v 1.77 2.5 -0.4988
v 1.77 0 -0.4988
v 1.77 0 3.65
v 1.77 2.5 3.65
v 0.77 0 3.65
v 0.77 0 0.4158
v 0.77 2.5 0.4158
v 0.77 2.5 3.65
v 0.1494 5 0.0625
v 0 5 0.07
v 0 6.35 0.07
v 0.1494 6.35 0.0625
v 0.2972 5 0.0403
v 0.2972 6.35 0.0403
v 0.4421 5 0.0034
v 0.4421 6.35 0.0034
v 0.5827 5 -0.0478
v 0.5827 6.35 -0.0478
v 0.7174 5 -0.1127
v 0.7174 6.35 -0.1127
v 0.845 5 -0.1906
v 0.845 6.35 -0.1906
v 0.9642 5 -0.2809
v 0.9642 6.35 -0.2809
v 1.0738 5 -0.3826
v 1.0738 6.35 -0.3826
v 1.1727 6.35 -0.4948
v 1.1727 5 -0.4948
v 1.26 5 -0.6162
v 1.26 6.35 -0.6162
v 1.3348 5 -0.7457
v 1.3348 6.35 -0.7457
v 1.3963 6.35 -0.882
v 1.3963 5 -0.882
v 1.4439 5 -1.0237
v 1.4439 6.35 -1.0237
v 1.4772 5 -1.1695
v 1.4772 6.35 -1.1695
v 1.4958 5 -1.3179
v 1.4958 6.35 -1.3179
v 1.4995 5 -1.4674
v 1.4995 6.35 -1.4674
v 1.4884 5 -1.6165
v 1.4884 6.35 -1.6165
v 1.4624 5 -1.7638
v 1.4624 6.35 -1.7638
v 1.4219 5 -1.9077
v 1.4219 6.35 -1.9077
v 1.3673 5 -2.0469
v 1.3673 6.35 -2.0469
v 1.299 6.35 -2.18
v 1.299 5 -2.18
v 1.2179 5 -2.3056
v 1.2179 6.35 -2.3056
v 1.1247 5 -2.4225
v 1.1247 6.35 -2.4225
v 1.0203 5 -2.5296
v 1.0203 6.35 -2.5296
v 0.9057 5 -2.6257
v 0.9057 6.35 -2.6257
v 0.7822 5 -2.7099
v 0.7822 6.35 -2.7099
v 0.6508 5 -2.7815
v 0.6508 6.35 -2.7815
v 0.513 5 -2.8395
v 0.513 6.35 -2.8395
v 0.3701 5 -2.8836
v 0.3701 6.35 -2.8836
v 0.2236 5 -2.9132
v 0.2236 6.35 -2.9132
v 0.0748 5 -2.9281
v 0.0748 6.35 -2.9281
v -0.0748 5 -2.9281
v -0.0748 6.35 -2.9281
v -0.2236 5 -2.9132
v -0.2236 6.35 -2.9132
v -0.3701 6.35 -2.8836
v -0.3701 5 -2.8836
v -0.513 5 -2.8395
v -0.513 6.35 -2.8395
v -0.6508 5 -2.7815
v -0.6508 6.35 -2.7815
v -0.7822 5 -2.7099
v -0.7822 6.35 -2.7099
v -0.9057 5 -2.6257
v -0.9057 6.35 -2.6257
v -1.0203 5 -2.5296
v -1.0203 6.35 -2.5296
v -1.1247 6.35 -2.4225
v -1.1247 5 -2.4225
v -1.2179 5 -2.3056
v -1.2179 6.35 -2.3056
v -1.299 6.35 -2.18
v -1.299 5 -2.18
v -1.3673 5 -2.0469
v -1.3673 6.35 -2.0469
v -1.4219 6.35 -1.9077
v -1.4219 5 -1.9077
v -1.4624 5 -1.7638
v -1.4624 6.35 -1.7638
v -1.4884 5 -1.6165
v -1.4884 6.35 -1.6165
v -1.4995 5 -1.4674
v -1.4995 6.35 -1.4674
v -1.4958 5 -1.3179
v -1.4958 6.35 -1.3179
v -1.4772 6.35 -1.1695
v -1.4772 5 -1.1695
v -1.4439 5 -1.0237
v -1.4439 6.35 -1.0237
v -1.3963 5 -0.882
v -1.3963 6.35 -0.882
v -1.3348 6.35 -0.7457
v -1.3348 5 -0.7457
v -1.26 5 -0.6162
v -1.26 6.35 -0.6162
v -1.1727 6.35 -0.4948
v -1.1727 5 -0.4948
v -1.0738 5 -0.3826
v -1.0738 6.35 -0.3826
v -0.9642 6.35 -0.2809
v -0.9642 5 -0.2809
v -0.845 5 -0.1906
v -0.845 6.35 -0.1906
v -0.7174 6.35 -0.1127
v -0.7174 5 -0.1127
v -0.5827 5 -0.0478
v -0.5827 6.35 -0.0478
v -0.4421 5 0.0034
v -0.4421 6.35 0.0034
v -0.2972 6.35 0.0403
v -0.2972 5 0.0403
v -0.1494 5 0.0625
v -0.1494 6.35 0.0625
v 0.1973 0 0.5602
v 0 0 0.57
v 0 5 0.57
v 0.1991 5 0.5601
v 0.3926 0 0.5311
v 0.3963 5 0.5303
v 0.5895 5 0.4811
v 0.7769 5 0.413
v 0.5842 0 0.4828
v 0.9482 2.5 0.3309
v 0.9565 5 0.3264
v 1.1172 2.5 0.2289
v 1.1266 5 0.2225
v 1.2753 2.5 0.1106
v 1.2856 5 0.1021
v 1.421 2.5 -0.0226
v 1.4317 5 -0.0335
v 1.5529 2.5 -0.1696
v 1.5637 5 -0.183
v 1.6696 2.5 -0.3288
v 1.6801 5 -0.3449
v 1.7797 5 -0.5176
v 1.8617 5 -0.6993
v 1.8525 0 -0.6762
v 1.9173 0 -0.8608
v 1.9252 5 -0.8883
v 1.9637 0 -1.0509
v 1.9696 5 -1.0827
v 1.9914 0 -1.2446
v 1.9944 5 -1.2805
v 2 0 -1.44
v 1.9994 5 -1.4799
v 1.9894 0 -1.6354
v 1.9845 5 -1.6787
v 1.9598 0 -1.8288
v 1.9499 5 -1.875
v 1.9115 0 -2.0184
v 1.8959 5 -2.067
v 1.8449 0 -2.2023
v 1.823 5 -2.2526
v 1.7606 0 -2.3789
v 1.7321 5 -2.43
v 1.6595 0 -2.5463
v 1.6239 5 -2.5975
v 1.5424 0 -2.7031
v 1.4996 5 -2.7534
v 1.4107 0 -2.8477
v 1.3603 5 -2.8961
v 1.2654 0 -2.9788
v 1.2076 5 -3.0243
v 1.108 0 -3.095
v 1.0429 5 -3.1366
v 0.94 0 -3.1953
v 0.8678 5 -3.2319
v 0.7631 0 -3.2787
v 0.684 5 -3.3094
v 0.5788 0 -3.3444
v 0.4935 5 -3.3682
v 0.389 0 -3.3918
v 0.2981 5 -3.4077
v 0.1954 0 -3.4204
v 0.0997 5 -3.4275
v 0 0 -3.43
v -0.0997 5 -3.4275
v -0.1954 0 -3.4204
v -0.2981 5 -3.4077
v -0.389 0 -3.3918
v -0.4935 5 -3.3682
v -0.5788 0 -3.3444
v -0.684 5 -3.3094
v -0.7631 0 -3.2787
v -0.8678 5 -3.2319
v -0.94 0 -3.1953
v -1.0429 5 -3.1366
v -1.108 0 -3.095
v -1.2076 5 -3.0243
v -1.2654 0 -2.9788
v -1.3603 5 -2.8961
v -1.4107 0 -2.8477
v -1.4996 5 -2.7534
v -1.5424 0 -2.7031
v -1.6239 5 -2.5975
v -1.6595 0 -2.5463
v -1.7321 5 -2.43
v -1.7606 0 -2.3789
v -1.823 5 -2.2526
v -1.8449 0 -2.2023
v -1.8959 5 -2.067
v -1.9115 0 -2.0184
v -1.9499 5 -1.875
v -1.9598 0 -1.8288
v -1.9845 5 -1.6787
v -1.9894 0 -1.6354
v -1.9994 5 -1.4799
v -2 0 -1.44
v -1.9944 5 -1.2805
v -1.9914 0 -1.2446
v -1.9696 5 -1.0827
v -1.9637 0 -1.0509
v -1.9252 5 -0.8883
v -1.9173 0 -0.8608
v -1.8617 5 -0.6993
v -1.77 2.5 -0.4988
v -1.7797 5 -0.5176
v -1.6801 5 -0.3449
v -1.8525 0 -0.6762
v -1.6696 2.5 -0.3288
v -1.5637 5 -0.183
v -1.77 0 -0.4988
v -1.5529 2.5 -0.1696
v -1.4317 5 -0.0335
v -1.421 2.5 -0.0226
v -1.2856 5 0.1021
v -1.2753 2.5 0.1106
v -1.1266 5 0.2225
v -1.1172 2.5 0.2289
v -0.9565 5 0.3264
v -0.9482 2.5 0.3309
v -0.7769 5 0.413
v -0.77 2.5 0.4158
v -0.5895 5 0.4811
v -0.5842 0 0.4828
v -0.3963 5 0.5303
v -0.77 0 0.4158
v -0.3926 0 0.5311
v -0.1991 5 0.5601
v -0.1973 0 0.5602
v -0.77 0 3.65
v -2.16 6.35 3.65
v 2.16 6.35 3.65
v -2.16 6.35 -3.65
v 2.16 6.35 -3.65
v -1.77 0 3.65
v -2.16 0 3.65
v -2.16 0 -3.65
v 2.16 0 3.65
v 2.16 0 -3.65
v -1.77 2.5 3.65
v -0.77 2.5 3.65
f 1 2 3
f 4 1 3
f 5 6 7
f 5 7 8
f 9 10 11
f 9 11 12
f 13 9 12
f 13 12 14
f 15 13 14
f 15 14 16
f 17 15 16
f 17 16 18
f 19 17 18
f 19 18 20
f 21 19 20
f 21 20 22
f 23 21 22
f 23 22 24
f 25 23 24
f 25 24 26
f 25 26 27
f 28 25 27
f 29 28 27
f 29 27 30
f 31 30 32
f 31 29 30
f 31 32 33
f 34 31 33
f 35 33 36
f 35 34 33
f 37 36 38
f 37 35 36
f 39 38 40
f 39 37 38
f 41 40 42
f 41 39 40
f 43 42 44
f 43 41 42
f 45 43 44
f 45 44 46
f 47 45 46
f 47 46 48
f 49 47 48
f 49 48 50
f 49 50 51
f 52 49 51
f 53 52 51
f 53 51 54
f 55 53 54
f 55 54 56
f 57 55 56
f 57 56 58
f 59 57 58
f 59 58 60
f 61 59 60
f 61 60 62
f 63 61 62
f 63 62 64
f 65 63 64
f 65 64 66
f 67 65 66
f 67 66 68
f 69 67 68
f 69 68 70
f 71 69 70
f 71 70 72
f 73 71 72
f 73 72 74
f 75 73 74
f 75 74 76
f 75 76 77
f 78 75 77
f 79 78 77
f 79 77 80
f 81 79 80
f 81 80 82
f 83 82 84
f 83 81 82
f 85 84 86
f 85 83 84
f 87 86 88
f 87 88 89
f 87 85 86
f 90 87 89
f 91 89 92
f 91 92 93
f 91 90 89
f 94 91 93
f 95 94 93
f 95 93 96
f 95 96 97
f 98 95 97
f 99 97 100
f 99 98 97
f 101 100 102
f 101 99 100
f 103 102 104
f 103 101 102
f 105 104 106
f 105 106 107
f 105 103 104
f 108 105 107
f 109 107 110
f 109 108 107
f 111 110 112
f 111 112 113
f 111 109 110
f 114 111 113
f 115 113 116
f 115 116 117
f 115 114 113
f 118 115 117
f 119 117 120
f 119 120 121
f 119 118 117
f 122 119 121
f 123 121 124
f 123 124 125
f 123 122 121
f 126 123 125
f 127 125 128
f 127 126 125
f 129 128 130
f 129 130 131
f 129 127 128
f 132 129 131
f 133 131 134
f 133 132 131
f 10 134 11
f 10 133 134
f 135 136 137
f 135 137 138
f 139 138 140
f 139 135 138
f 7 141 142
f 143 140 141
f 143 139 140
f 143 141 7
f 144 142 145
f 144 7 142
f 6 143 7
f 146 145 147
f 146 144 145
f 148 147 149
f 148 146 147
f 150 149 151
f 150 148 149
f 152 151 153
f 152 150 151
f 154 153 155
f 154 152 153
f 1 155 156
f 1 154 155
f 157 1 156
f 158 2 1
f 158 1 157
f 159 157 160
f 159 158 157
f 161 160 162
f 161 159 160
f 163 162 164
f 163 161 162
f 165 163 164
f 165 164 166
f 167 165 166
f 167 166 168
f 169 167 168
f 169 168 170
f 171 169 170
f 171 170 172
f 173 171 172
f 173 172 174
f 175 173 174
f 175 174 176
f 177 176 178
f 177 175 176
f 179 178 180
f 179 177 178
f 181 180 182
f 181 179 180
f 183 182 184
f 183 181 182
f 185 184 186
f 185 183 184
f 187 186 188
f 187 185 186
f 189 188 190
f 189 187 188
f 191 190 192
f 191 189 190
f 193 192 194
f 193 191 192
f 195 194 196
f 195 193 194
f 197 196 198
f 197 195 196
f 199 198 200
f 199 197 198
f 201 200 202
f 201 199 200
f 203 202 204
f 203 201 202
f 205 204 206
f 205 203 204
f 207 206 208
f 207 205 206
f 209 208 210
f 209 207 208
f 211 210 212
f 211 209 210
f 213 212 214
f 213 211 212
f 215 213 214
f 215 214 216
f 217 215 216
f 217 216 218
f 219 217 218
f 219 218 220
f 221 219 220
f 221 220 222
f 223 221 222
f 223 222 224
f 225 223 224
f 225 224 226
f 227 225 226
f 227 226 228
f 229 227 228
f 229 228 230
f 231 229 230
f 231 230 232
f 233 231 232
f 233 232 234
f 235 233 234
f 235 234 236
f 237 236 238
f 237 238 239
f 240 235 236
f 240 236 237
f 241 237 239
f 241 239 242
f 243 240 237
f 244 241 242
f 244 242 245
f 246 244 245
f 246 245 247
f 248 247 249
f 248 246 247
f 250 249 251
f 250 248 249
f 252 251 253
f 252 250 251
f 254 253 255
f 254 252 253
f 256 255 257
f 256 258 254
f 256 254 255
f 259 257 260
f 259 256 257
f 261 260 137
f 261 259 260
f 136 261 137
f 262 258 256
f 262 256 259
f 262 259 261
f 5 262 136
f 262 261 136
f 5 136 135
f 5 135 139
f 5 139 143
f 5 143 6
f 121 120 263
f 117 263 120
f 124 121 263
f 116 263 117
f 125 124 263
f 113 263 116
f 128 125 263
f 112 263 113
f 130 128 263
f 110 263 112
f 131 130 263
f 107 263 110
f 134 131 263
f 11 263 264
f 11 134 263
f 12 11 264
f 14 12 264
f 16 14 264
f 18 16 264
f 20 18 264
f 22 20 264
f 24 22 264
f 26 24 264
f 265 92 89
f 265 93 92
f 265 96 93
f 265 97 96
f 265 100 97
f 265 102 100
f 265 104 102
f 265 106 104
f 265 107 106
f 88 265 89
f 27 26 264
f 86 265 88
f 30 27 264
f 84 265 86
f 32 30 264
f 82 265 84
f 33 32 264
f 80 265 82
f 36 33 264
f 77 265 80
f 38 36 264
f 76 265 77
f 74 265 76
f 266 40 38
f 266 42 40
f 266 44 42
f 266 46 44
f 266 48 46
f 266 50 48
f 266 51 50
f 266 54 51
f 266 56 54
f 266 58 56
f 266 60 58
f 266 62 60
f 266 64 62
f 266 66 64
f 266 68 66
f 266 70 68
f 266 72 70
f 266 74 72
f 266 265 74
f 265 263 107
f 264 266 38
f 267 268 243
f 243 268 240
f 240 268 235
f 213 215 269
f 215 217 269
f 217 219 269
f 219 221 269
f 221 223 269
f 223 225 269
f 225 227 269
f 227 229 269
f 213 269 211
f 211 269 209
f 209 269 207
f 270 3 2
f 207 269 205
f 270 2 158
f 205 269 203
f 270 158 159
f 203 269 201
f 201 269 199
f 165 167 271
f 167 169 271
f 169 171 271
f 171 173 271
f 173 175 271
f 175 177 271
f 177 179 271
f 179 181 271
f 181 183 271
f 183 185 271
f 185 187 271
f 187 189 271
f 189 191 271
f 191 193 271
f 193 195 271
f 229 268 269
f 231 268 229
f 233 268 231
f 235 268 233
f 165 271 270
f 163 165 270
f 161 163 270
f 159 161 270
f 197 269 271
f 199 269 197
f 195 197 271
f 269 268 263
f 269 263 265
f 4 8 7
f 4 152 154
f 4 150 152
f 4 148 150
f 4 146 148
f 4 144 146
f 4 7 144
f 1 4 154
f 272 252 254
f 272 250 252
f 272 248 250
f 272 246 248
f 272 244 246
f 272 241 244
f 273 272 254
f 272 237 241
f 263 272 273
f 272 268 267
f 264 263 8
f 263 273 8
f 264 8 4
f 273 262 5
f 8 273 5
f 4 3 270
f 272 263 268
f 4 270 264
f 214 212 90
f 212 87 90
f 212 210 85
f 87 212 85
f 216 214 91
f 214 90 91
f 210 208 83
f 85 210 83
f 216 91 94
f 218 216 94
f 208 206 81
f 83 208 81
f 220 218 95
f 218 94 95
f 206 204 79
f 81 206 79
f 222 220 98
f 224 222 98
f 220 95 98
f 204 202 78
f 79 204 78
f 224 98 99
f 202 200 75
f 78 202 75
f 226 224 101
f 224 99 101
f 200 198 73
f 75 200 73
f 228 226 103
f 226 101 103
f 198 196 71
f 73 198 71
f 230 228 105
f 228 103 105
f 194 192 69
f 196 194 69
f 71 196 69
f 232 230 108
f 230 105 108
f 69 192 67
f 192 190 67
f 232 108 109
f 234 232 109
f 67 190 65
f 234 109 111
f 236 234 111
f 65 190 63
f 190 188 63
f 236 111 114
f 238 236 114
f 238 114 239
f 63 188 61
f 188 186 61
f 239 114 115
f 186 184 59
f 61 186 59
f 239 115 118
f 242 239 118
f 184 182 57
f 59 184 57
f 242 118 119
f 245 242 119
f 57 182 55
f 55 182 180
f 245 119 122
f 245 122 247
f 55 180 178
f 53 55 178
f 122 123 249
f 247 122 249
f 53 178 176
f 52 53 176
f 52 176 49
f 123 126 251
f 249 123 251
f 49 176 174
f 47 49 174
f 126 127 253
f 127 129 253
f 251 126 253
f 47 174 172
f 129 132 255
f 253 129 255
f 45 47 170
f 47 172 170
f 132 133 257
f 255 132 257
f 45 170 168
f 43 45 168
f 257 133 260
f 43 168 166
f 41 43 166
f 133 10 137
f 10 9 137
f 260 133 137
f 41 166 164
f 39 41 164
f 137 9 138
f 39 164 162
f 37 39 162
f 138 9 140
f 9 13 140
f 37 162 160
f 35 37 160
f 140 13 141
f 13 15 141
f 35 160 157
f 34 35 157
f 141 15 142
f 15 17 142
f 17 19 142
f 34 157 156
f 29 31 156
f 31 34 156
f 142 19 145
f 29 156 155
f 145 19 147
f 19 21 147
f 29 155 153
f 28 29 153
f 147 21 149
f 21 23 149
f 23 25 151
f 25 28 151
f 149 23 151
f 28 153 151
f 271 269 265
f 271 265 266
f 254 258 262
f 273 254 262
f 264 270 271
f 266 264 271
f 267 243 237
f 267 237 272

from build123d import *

# Parameters (mm, degrees)
SKETCH_1_W          = 4.32
SKETCH_1_H          = 7.3
SKETCH_1_R          = 1.5
EXTRUDE_2_DEPTH     = 6.35
SKETCH_1_4_R        = 2
SKETCH_1_4_R_2      = 1.5
CUT_EXTRUDE_1_DEPTH = 5
SKETCH_2_W          = 1
SKETCH_2_H          = 4.148817955
CUT_EXTRUDE_2_DEPTH = 2.5


with BuildPart() as part:
    # Эскиз1 → Бобышка-Вытянуть2 (new body)
    with BuildSketch(Plane(origin=(0, 0, 0), x_dir=(1, 0, 0), z_dir=(0, 1, 0))):
        Rectangle(SKETCH_1_W, SKETCH_1_H)
        with Locations((0, 1.43)):
            Circle(SKETCH_1_R, mode=Mode.SUBTRACT)
    extrude(amount=EXTRUDE_2_DEPTH)

    # Эскиз1<4> → Вырез-Вытянуть1 (cut)
    with BuildSketch(Plane(origin=(0, 0, 0), x_dir=(1, 0, 0), z_dir=(0, 1, 0))):
        with Locations((0, 1.43)):
            Circle(SKETCH_1_4_R)
        with Locations((0, 1.43)):
            Circle(SKETCH_1_4_R_2, mode=Mode.SUBTRACT)
    extrude(amount=CUT_EXTRUDE_1_DEPTH, mode=Mode.SUBTRACT)

    # Эскиз2 → Вырез-Вытянуть2 (cut)
    with BuildSketch(Plane.XZ):
        with Locations((-1.27, 1.575591023)):
            Rectangle(SKETCH_2_W, SKETCH_2_H)
        with Locations((1.27, 1.575591023)):
            Rectangle(SKETCH_2_W, SKETCH_2_H)
    extrude(amount=-CUT_EXTRUDE_2_DEPTH, mode=Mode.SUBTRACT)


solid = part.part
